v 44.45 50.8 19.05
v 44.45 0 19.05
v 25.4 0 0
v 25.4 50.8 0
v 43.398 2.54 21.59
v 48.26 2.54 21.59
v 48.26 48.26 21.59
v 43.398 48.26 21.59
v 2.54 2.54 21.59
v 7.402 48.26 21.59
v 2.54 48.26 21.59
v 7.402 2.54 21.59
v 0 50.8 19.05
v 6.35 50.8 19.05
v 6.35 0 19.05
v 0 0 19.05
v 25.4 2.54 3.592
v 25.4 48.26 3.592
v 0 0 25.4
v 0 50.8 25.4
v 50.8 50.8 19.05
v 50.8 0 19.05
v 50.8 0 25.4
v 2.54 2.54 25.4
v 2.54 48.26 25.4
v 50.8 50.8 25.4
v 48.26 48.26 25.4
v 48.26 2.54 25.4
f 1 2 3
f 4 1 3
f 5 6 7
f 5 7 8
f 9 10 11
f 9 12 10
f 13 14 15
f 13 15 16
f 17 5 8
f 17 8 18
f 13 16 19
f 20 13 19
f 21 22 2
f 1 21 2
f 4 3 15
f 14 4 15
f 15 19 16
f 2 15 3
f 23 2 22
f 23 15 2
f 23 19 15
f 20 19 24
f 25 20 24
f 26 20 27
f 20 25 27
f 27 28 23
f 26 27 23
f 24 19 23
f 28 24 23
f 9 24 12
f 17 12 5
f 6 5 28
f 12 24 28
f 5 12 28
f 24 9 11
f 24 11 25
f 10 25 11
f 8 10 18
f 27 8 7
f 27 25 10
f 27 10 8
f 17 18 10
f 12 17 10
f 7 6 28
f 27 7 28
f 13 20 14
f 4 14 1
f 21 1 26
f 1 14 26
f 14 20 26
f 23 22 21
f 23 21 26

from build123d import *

# Parameters (mm, degrees)
F0_W     = 50.8
F0_H     = 25.4
F1_DEPTH = 50.8
F3_DEPTH = 50.8
F5_DEPTH = 50.8
F6_T     = -2.54


with BuildPart() as f1:
    # F0 (on Front) → F1 (new body)
    with BuildSketch(Plane.XZ):
        with Locations((25.4, 12.7)):
            Rectangle(F0_W, F0_H)
    extrude(amount=-F1_DEPTH)

    # F2 (on face) → F3 (cut)
    with BuildSketch(Plane.XZ):
        Polygon((0, 19.05), (0, 0), (25.4, 0), (6.35, 19.05), align=None)
    extrude(amount=-F3_DEPTH, mode=Mode.SUBTRACT)

    # F4 (on face) → F5 (cut)
    with BuildSketch(Plane.XZ):
        Polygon((25.4, 0), (50.8, 0), (50.8, 19.05), (44.45, 19.05), align=None)
    extrude(amount=-F5_DEPTH, mode=Mode.SUBTRACT)

    # F6
    f6_openings = [f1.faces().sort_by_distance(p)[0] for p in [
        (25.4, 25.4, 25.4),
    ]]
    offset(amount=F6_T, openings=f6_openings, kind=Kind.INTERSECTION)


solid = f1.part
